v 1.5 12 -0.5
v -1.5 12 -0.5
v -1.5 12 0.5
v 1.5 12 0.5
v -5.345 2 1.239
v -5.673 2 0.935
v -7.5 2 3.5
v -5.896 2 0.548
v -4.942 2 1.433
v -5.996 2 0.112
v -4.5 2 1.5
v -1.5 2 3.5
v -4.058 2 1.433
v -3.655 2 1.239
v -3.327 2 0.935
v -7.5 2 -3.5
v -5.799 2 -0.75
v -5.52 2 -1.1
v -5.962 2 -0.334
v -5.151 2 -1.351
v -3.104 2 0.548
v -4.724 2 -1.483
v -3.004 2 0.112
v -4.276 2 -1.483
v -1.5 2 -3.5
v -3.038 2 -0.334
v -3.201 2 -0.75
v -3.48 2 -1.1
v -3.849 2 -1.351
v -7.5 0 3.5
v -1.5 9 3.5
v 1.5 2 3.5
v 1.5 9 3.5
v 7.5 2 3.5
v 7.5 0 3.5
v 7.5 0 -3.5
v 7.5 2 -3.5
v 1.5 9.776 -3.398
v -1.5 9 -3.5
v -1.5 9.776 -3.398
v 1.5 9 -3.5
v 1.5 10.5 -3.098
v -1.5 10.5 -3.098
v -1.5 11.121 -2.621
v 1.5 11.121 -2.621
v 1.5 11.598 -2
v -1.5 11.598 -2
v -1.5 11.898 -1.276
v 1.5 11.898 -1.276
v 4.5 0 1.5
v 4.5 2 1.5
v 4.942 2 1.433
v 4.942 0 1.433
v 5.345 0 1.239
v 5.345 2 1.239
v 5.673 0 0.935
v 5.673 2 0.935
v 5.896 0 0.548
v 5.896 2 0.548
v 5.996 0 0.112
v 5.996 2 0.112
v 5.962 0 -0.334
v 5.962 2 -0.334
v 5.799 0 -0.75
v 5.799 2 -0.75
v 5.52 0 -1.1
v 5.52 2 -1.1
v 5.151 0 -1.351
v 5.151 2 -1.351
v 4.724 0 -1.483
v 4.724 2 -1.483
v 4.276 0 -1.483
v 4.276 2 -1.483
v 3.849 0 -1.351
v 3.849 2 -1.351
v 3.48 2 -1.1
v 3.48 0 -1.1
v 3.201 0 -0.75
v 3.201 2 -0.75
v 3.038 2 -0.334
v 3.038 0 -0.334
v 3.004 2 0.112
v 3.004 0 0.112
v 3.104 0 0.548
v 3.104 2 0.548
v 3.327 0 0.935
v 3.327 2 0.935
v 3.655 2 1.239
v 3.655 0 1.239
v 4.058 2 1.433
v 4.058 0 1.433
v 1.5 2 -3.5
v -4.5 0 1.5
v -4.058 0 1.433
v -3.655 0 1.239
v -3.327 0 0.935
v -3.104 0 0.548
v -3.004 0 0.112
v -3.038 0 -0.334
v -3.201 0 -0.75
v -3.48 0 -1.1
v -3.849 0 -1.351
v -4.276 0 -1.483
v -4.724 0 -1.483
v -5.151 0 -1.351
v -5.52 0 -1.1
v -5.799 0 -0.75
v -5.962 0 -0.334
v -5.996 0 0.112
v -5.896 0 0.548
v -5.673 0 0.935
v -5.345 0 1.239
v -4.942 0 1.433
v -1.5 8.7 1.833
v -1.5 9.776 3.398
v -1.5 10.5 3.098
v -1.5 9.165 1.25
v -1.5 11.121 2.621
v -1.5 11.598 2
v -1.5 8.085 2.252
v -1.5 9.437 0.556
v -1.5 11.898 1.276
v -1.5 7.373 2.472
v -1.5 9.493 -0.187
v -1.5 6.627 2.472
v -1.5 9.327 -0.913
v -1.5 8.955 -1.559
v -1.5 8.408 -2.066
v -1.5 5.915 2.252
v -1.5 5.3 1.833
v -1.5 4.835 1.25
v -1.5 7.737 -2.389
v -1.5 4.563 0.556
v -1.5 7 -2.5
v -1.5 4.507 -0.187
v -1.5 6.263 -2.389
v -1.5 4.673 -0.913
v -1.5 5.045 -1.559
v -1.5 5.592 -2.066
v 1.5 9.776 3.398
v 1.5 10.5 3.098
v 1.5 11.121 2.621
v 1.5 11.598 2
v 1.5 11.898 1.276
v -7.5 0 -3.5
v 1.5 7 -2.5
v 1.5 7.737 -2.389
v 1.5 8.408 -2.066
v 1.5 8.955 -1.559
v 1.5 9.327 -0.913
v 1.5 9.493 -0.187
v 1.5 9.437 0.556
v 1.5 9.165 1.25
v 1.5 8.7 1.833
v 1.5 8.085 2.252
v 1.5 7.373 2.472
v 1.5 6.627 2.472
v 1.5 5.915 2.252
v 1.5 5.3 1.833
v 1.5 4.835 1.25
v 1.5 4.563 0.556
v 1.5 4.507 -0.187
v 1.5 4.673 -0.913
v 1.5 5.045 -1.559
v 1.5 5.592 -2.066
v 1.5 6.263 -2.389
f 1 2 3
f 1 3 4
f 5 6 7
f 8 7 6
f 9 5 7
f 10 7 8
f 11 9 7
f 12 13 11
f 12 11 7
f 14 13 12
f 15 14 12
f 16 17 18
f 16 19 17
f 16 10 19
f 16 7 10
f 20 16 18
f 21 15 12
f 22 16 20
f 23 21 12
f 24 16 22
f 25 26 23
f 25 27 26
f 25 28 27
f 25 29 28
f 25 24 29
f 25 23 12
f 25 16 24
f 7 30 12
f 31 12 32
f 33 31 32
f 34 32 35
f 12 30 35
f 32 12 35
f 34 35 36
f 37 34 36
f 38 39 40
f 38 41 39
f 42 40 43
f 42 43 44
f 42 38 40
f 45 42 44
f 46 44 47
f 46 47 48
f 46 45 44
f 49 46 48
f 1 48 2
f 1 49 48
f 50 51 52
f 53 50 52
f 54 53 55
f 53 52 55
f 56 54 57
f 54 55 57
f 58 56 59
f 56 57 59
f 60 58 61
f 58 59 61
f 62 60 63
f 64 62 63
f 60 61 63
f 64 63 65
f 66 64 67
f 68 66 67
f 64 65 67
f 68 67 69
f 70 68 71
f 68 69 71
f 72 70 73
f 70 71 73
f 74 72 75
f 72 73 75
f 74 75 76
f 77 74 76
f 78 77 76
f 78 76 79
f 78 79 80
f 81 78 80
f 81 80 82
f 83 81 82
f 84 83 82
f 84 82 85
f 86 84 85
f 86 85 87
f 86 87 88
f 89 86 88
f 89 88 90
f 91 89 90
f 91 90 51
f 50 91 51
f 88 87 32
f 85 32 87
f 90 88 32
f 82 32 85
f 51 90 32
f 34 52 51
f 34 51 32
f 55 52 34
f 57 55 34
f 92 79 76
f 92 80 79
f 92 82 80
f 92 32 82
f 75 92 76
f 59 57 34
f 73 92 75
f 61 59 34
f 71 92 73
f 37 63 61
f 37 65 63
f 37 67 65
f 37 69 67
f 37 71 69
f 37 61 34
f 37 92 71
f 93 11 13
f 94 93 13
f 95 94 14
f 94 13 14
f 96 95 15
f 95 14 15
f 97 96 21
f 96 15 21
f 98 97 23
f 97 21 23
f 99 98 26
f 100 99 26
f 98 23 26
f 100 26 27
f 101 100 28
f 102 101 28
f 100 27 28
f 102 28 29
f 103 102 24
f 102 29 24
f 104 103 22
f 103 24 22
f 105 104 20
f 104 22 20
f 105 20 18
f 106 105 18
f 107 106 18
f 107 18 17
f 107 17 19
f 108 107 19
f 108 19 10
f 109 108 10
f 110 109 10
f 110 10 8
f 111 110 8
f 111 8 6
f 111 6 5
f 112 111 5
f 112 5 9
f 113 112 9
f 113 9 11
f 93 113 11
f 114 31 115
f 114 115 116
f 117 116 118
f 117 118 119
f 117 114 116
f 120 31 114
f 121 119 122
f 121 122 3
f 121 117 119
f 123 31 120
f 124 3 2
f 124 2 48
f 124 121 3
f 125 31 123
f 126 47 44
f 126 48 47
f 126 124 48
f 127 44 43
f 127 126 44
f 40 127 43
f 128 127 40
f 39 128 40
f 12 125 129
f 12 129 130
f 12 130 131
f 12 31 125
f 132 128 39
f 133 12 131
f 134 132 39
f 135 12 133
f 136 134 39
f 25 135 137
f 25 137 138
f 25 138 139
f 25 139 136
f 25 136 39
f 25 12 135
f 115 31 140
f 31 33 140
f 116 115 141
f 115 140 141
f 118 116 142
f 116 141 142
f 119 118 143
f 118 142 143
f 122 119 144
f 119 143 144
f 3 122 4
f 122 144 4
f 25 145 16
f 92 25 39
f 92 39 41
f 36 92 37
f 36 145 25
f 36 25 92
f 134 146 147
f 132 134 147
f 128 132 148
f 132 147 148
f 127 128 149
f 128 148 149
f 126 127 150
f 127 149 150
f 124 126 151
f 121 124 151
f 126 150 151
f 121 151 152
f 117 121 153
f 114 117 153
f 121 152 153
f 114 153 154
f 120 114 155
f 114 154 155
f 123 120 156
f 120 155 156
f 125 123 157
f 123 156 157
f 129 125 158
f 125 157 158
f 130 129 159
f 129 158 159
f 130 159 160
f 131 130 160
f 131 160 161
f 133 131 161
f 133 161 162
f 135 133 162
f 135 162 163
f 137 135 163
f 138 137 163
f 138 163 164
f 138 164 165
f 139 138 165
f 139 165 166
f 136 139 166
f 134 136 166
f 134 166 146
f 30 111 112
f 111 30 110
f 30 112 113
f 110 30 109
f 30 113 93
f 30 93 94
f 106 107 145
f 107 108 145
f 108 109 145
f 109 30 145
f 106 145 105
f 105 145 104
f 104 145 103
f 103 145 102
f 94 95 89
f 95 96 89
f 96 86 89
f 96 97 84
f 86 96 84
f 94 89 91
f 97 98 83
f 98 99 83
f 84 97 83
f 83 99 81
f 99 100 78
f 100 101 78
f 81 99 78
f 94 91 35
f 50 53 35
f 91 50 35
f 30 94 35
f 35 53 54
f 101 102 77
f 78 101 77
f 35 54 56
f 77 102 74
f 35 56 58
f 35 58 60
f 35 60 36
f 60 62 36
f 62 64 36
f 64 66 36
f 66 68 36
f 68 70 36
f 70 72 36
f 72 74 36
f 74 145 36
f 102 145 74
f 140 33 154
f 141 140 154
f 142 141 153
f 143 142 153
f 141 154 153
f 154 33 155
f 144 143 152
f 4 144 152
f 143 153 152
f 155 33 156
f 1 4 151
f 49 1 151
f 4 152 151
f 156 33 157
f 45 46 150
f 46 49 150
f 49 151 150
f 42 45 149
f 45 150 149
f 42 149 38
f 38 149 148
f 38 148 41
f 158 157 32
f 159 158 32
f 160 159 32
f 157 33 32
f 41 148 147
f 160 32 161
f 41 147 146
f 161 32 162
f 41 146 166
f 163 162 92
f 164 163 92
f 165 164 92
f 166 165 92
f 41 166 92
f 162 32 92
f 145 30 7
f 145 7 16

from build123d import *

# Parameters (mm, degrees)
SKETCH1_W           = 15
SKETCH1_H           = 7
BOSS_EXTRUDE1_DEPTH = 2
SKETCH2_W           = 3
SKETCH2_H           = 7
BOSS_EXTRUDE2_DEPTH = 10
SKETCH3_R           = 2.5
CUT_EXTRUDE1_DEPTH  = 10
FILLET1_R           = 3
SKETCH4_R           = 1.5
CUT_EXTRUDE2_DEPTH  = 10


with BuildPart() as part:
    # Sketch1 → Boss-Extrude1 (new body)
    with BuildSketch(Plane(origin=(0, 0, 0), x_dir=(1, 0, 0), z_dir=(0, 1, 0))):
        Rectangle(SKETCH1_W, SKETCH1_H)
    extrude(amount=BOSS_EXTRUDE1_DEPTH)

    # Sketch2 → Boss-Extrude2 (add)
    with BuildSketch(Plane(origin=(0, 2, 0), x_dir=(1, 0, 0), z_dir=(0, 1, 0))):
        Rectangle(SKETCH2_W, SKETCH2_H)
    extrude(amount=BOSS_EXTRUDE2_DEPTH)

    # Sketch3 → Cut-Extrude1 (cut)
    with BuildSketch(Plane(origin=(1.5, 0, 0), x_dir=(0, 0, -1), z_dir=(1, 0, 0))):
        with Locations((0, 7)):
            Circle(SKETCH3_R)
    extrude(amount=-CUT_EXTRUDE1_DEPTH, mode=Mode.SUBTRACT)

    # Fillet1
    fillet1_edges = [part.edges().sort_by_distance(p)[0] for p in [
        (0, 12, 3.5),
        (0, 12, -3.5),
    ]]
    fillet(fillet1_edges, radius=FILLET1_R)

    # Sketch4 → Cut-Extrude2 (cut)
    with BuildSketch(Plane(origin=(0, 2, 0), x_dir=(1, 0, 0), z_dir=(0, 1, 0))):
        with Locations(Location((4.5, 0, 0), (0, 0, 270))):
            Circle(SKETCH4_R)
        with Locations(Location((-4.5, 0, 0), (0, 0, 270))):
            Circle(SKETCH4_R)
    extrude(amount=-CUT_EXTRUDE2_DEPTH, mode=Mode.SUBTRACT)


solid = part.part
